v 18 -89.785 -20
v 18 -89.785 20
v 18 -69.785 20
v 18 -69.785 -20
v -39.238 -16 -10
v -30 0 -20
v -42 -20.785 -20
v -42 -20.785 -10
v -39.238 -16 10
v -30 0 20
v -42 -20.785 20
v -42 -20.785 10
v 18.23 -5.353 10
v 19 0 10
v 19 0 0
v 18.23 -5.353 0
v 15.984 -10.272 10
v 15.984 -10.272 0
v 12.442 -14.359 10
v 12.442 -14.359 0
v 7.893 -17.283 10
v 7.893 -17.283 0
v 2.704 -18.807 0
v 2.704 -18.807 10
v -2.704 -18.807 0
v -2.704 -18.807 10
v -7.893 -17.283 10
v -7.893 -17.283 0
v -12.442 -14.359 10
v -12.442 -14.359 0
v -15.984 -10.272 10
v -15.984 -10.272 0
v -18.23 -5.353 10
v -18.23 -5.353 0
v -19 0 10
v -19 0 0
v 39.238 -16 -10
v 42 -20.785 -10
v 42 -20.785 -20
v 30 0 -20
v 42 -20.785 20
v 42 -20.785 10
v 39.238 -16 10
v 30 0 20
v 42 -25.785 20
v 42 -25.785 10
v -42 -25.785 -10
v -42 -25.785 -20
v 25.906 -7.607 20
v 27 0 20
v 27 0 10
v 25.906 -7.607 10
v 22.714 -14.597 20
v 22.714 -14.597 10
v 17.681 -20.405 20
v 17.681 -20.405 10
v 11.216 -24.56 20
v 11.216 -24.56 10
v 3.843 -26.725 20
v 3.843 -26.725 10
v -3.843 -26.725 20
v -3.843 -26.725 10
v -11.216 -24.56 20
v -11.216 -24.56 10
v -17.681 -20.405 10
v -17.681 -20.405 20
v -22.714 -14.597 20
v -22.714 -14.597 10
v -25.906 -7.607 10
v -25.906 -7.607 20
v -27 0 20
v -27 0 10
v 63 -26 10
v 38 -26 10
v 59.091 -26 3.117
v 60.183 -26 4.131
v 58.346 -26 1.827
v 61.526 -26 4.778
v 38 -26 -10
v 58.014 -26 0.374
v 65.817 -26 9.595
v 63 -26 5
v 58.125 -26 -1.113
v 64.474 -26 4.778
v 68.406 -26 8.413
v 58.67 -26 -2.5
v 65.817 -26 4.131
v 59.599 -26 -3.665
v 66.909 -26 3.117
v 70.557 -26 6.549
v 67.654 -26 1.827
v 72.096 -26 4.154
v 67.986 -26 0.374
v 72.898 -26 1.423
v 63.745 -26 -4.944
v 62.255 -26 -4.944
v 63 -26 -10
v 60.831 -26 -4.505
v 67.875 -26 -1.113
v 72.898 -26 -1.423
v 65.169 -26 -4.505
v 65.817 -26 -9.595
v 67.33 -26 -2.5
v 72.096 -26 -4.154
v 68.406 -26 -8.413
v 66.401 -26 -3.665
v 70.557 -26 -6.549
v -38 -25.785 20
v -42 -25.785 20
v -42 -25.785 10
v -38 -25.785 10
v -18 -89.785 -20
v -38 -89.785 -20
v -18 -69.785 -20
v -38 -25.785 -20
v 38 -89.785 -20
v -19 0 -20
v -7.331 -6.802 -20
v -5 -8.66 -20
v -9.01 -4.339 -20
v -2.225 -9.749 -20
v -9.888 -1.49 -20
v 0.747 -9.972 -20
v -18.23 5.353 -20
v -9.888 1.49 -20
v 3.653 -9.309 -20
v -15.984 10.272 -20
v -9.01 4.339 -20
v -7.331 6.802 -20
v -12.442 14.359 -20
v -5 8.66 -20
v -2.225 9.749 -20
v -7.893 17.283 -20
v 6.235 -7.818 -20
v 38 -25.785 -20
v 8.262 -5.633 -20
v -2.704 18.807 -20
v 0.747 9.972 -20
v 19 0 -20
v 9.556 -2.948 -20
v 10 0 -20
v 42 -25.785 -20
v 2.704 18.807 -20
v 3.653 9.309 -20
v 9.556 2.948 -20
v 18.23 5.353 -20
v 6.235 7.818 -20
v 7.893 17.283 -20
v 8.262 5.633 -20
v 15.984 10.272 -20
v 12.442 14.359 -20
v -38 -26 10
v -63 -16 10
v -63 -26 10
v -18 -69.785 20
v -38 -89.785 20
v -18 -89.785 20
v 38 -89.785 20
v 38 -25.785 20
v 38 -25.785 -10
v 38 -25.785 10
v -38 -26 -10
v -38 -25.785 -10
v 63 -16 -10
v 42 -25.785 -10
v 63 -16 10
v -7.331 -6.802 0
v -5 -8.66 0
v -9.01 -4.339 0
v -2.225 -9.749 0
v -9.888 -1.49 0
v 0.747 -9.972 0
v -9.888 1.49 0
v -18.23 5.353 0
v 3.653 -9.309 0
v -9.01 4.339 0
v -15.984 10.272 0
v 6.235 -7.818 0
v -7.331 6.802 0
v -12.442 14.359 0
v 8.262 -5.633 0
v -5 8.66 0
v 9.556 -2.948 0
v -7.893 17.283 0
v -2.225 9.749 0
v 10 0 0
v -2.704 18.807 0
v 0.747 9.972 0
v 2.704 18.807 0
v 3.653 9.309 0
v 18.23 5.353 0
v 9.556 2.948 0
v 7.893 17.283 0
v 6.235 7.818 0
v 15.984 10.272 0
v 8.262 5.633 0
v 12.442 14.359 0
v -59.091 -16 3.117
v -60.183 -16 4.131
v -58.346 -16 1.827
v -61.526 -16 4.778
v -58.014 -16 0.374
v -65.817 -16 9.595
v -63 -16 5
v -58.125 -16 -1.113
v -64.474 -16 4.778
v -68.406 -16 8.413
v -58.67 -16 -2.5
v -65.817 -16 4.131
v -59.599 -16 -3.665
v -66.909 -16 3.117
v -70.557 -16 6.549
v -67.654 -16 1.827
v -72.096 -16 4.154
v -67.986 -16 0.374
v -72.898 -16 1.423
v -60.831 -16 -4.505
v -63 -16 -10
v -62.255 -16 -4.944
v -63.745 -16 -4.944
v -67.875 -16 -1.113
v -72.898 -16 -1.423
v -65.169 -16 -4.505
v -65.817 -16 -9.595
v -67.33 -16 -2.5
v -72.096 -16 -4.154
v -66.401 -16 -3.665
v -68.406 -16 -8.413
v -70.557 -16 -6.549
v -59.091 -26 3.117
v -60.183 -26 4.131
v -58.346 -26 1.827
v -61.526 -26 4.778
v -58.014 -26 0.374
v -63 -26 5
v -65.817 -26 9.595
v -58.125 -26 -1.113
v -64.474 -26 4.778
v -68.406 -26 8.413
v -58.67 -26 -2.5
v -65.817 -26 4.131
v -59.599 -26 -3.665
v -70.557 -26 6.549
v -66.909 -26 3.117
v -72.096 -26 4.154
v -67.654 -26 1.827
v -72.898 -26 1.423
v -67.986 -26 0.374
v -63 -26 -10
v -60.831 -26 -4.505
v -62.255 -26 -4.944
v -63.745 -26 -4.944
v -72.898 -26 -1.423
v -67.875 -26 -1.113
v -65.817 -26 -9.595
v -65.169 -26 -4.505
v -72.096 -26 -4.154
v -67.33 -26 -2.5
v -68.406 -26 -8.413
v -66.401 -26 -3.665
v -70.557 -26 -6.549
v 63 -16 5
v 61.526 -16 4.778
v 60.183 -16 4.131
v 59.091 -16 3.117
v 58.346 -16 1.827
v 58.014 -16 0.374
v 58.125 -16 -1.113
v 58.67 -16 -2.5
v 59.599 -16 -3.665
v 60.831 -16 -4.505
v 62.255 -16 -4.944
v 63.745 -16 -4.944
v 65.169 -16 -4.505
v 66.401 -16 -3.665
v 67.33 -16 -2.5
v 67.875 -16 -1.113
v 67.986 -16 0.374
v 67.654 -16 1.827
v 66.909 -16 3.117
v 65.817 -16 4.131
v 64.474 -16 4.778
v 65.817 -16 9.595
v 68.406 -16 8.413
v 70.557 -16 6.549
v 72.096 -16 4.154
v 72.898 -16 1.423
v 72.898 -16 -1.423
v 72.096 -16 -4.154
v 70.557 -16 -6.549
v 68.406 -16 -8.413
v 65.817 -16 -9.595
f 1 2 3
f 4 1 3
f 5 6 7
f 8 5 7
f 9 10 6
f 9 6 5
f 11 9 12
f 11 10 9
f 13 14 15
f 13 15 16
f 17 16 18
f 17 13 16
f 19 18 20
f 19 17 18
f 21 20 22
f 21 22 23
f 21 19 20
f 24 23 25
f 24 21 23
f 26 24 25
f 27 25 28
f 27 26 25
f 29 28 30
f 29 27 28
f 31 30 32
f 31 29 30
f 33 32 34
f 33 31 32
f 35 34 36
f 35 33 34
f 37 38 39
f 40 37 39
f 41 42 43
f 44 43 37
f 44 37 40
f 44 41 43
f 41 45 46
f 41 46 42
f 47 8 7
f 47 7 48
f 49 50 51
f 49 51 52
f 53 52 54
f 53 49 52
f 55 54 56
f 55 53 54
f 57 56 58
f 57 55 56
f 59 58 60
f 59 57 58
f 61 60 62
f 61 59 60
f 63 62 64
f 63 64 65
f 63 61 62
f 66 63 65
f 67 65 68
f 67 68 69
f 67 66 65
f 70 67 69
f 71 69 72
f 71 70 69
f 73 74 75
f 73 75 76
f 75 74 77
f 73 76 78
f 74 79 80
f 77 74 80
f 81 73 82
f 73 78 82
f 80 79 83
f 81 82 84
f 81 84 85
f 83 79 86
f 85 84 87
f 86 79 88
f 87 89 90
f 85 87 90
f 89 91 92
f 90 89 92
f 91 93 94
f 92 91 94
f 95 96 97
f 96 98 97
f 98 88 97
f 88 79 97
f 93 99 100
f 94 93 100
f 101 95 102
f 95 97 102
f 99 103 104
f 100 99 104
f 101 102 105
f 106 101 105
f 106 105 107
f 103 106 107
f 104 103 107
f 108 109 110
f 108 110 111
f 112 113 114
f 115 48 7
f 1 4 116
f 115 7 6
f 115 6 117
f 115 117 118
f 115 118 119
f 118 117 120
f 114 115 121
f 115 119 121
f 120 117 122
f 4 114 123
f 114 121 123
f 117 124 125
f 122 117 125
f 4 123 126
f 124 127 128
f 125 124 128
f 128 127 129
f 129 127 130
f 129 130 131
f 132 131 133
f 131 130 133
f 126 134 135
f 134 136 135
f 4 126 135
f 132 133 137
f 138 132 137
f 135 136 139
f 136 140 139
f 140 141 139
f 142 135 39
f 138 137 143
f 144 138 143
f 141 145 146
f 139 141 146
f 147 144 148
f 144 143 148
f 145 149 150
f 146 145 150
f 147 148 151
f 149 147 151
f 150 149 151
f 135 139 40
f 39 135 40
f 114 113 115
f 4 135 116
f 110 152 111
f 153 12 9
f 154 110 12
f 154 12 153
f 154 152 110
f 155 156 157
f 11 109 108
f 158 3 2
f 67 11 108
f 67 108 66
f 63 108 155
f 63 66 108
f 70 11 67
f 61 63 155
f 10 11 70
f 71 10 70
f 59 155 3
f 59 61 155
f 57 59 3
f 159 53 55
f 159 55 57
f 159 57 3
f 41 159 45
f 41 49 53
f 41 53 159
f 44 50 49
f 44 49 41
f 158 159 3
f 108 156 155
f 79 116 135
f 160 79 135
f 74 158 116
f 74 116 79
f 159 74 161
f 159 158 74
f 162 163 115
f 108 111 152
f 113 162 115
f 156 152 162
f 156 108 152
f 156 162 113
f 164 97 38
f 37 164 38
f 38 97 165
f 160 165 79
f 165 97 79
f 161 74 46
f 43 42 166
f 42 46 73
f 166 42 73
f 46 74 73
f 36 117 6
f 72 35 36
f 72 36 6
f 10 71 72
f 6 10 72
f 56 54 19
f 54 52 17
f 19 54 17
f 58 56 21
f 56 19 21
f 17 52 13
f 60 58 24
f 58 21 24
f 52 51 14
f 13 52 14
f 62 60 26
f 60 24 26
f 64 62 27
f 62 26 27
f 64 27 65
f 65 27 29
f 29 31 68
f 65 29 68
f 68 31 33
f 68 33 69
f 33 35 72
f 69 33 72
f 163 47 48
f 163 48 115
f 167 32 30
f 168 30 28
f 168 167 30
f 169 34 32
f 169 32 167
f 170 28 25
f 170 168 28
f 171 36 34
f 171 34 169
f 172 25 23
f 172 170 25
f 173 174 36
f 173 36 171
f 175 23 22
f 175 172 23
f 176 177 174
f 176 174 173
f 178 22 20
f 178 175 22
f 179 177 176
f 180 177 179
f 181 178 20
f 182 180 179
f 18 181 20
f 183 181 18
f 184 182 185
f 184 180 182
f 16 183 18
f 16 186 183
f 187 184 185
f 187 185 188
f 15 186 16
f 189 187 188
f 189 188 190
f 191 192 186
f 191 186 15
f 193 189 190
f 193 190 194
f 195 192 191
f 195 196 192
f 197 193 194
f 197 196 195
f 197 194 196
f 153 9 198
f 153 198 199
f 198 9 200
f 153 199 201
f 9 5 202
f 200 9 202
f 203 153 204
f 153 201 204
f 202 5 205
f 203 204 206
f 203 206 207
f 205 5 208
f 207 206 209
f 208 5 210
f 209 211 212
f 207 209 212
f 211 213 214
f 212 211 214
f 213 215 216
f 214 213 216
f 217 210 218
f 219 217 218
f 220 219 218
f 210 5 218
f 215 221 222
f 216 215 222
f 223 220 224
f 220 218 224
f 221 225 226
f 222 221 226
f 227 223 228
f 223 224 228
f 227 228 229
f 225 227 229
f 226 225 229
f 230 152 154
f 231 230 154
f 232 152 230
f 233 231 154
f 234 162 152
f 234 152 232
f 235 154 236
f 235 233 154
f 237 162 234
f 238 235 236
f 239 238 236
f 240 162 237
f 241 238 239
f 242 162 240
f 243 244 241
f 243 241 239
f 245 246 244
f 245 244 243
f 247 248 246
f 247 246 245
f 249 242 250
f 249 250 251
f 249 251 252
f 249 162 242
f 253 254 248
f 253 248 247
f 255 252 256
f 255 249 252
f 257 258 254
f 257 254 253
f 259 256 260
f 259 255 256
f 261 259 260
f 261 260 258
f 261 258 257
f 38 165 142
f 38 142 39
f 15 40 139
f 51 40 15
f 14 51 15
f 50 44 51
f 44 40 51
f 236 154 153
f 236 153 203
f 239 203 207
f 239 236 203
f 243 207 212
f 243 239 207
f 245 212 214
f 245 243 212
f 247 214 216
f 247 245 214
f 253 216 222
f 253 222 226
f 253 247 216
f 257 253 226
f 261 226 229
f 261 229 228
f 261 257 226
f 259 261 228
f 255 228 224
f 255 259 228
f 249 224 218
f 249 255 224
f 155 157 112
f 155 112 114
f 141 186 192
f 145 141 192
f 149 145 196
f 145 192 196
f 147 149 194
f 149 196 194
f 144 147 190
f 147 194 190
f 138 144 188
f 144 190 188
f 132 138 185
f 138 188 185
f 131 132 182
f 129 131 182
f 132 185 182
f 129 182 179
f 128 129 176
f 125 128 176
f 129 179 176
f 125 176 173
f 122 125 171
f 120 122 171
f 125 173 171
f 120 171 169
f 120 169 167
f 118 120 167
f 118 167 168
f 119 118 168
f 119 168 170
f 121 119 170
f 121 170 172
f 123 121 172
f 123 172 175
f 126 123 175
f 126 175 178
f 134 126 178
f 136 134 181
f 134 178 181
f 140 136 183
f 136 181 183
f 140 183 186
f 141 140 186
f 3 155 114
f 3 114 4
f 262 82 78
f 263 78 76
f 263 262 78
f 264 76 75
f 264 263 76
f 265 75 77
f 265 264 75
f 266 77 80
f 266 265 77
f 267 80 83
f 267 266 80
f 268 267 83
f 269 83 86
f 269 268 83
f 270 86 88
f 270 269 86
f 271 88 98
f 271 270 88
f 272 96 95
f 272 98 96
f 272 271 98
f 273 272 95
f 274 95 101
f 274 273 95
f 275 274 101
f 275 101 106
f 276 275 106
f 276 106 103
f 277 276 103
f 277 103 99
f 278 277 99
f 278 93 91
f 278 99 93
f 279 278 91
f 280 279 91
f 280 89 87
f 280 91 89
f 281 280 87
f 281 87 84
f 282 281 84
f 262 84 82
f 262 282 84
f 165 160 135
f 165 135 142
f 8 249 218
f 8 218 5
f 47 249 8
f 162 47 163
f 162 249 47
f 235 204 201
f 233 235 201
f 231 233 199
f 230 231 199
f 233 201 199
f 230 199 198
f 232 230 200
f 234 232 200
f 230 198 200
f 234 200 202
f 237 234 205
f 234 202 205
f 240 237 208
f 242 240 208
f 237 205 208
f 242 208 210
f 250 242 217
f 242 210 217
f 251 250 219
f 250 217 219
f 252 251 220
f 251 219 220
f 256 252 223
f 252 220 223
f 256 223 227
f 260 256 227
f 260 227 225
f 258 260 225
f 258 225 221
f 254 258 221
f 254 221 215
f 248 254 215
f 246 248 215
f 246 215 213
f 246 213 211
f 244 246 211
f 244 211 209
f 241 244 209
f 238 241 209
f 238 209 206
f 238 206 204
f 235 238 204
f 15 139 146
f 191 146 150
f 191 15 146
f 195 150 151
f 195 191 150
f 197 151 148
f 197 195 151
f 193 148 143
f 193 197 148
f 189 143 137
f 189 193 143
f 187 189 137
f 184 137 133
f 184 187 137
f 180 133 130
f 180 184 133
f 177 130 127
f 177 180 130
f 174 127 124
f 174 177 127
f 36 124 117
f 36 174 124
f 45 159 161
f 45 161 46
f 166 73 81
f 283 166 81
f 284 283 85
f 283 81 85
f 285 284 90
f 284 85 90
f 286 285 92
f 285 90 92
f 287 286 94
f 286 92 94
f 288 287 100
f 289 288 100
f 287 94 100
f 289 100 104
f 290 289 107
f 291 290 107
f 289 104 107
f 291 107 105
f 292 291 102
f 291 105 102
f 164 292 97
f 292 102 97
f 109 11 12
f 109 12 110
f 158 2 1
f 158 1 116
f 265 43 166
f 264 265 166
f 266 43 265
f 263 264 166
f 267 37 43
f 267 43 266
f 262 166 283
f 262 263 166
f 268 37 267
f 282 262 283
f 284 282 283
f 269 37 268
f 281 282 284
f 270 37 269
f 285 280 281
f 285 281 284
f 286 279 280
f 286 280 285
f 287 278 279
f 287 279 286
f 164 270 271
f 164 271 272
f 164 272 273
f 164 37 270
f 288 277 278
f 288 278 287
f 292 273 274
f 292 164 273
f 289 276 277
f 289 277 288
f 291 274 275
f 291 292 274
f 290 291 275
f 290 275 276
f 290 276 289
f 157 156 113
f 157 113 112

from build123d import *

# Parameters (mm, degrees)
BOSS_EXTRUDE1_DEPTH = 20
SKETCH2_W           = 36
SKETCH2_H           = 20
CUT_EXTRUDE1_DEPTH  = 107.88908334
CUT_EXTRUDE3_DEPTH  = 10
CUT_EXTRUDE5_DEPTH  = 10
SKETCH6_R           = 19
SKETCH6_R_2         = 10
BOSS_EXTRUDE2_DEPTH = 20
CUT_EXTRUDE6_DEPTH  = 102.120107483
BOSS_EXTRUDE3_START = -26
BOSS_EXTRUDE3_DEPTH = 10
SKETCH9_R           = 5
CUT_EXTRUDE7_DEPTH  = 106.703210108


with BuildPart() as part:
    # Sketch1 → Boss-Extrude1 (new, symmetric)
    with BuildSketch(Plane.XY):
        Polygon((38, -89.784609691), (38, -25.784609691), (42, -25.784609691), (42, -20.784609691), (30, 0), (-30, 0), (-42, -20.784609691), (-42, -25.784609691), (-38, -25.784609691), (-38, -89.784609691), align=None)
    extrude(amount=BOSS_EXTRUDE1_DEPTH, both=True)

    # Sketch2 → Cut-Extrude1 (cut, through all)
    with BuildSketch(Plane.XY.offset(20)):
        with Locations((0, -79.784609691)):
            Rectangle(SKETCH2_W, SKETCH2_H)
    extrude(amount=-CUT_EXTRUDE1_DEPTH, mode=Mode.SUBTRACT)

    # Sketch3 → Cut-Extrude3 (cut)
    with BuildSketch(Plane.XY.offset(20)):
        with BuildLine():
            Line((-27, 0), (27, 0))
            ThreePointArc((27, 0), (0, -27), (-27, 0))
        make_face()
    extrude(amount=-CUT_EXTRUDE3_DEPTH, mode=Mode.SUBTRACT)

    # Sketch5 → Cut-Extrude5 (cut)
    with BuildSketch(Plane.XY.offset(10)):
        with BuildLine():
            Line((-19, 0), (19, 0))
            ThreePointArc((19, 0), (0, -19), (-19, 0))
        make_face()
    extrude(amount=-CUT_EXTRUDE5_DEPTH, mode=Mode.SUBTRACT)

    # Sketch6 → Boss-Extrude2 (add)
    with BuildSketch(Plane.XY):
        Circle(SKETCH6_R)
        Circle(SKETCH6_R_2, mode=Mode.SUBTRACT)
    extrude(amount=-BOSS_EXTRUDE2_DEPTH)

    # Sketch6<2> → Cut-Extrude6 (cut, through all)
    with BuildSketch(Plane.XY):
        with BuildLine():
            Line((-10, 0), (10, 0))
            ThreePointArc((10, 0), (0, 10), (-10, 0))
        make_face()
        with BuildLine():
            ThreePointArc((-10, 0), (0, -10), (10, 0))
            Line((10, 0), (-10, 0))
        make_face()
    extrude(amount=-CUT_EXTRUDE6_DEPTH, mode=Mode.SUBTRACT)

    # Sketch8 → Boss-Extrude3 (add)
    with BuildSketch(Plane(origin=(0, 0, 0), x_dir=(1, 0, 0), z_dir=(0, 1, 0)).offset(BOSS_EXTRUDE3_START)):
        with BuildLine():
            Line((63, 10), (27, 10))
            Line((27, 10), (27, -10))
            Line((27, -10), (63, -10))
            ThreePointArc((63, -10), (73, 0), (63, 10))
        make_face()
    boss_extrude3 = extrude(amount=BOSS_EXTRUDE3_DEPTH)

    # Mirror1: Boss-Extrude3 across plane
    add(boss_extrude3.mirror(Plane(origin=(0, 0, 0), x_dir=(0, 0, 1), z_dir=(1, 0, 0))))

    # Sketch9 → Cut-Extrude7 (cut, through all)
    with BuildSketch(Plane(origin=(0, -16, 0), x_dir=(1, 0, 0), z_dir=(0, 1, 0))):
        with Locations(Location((-63, 0, 0), (0, 0, 270))):
            Circle(SKETCH9_R)
    cut_extrude7 = extrude(amount=-CUT_EXTRUDE7_DEPTH, mode=Mode.SUBTRACT)

    # Mirror2: Cut-Extrude7 across plane
    add(cut_extrude7.mirror(Plane(origin=(0, 0, 0), x_dir=(0, 0, 1), z_dir=(1, 0, 0))), mode=Mode.SUBTRACT)


solid = part.part
